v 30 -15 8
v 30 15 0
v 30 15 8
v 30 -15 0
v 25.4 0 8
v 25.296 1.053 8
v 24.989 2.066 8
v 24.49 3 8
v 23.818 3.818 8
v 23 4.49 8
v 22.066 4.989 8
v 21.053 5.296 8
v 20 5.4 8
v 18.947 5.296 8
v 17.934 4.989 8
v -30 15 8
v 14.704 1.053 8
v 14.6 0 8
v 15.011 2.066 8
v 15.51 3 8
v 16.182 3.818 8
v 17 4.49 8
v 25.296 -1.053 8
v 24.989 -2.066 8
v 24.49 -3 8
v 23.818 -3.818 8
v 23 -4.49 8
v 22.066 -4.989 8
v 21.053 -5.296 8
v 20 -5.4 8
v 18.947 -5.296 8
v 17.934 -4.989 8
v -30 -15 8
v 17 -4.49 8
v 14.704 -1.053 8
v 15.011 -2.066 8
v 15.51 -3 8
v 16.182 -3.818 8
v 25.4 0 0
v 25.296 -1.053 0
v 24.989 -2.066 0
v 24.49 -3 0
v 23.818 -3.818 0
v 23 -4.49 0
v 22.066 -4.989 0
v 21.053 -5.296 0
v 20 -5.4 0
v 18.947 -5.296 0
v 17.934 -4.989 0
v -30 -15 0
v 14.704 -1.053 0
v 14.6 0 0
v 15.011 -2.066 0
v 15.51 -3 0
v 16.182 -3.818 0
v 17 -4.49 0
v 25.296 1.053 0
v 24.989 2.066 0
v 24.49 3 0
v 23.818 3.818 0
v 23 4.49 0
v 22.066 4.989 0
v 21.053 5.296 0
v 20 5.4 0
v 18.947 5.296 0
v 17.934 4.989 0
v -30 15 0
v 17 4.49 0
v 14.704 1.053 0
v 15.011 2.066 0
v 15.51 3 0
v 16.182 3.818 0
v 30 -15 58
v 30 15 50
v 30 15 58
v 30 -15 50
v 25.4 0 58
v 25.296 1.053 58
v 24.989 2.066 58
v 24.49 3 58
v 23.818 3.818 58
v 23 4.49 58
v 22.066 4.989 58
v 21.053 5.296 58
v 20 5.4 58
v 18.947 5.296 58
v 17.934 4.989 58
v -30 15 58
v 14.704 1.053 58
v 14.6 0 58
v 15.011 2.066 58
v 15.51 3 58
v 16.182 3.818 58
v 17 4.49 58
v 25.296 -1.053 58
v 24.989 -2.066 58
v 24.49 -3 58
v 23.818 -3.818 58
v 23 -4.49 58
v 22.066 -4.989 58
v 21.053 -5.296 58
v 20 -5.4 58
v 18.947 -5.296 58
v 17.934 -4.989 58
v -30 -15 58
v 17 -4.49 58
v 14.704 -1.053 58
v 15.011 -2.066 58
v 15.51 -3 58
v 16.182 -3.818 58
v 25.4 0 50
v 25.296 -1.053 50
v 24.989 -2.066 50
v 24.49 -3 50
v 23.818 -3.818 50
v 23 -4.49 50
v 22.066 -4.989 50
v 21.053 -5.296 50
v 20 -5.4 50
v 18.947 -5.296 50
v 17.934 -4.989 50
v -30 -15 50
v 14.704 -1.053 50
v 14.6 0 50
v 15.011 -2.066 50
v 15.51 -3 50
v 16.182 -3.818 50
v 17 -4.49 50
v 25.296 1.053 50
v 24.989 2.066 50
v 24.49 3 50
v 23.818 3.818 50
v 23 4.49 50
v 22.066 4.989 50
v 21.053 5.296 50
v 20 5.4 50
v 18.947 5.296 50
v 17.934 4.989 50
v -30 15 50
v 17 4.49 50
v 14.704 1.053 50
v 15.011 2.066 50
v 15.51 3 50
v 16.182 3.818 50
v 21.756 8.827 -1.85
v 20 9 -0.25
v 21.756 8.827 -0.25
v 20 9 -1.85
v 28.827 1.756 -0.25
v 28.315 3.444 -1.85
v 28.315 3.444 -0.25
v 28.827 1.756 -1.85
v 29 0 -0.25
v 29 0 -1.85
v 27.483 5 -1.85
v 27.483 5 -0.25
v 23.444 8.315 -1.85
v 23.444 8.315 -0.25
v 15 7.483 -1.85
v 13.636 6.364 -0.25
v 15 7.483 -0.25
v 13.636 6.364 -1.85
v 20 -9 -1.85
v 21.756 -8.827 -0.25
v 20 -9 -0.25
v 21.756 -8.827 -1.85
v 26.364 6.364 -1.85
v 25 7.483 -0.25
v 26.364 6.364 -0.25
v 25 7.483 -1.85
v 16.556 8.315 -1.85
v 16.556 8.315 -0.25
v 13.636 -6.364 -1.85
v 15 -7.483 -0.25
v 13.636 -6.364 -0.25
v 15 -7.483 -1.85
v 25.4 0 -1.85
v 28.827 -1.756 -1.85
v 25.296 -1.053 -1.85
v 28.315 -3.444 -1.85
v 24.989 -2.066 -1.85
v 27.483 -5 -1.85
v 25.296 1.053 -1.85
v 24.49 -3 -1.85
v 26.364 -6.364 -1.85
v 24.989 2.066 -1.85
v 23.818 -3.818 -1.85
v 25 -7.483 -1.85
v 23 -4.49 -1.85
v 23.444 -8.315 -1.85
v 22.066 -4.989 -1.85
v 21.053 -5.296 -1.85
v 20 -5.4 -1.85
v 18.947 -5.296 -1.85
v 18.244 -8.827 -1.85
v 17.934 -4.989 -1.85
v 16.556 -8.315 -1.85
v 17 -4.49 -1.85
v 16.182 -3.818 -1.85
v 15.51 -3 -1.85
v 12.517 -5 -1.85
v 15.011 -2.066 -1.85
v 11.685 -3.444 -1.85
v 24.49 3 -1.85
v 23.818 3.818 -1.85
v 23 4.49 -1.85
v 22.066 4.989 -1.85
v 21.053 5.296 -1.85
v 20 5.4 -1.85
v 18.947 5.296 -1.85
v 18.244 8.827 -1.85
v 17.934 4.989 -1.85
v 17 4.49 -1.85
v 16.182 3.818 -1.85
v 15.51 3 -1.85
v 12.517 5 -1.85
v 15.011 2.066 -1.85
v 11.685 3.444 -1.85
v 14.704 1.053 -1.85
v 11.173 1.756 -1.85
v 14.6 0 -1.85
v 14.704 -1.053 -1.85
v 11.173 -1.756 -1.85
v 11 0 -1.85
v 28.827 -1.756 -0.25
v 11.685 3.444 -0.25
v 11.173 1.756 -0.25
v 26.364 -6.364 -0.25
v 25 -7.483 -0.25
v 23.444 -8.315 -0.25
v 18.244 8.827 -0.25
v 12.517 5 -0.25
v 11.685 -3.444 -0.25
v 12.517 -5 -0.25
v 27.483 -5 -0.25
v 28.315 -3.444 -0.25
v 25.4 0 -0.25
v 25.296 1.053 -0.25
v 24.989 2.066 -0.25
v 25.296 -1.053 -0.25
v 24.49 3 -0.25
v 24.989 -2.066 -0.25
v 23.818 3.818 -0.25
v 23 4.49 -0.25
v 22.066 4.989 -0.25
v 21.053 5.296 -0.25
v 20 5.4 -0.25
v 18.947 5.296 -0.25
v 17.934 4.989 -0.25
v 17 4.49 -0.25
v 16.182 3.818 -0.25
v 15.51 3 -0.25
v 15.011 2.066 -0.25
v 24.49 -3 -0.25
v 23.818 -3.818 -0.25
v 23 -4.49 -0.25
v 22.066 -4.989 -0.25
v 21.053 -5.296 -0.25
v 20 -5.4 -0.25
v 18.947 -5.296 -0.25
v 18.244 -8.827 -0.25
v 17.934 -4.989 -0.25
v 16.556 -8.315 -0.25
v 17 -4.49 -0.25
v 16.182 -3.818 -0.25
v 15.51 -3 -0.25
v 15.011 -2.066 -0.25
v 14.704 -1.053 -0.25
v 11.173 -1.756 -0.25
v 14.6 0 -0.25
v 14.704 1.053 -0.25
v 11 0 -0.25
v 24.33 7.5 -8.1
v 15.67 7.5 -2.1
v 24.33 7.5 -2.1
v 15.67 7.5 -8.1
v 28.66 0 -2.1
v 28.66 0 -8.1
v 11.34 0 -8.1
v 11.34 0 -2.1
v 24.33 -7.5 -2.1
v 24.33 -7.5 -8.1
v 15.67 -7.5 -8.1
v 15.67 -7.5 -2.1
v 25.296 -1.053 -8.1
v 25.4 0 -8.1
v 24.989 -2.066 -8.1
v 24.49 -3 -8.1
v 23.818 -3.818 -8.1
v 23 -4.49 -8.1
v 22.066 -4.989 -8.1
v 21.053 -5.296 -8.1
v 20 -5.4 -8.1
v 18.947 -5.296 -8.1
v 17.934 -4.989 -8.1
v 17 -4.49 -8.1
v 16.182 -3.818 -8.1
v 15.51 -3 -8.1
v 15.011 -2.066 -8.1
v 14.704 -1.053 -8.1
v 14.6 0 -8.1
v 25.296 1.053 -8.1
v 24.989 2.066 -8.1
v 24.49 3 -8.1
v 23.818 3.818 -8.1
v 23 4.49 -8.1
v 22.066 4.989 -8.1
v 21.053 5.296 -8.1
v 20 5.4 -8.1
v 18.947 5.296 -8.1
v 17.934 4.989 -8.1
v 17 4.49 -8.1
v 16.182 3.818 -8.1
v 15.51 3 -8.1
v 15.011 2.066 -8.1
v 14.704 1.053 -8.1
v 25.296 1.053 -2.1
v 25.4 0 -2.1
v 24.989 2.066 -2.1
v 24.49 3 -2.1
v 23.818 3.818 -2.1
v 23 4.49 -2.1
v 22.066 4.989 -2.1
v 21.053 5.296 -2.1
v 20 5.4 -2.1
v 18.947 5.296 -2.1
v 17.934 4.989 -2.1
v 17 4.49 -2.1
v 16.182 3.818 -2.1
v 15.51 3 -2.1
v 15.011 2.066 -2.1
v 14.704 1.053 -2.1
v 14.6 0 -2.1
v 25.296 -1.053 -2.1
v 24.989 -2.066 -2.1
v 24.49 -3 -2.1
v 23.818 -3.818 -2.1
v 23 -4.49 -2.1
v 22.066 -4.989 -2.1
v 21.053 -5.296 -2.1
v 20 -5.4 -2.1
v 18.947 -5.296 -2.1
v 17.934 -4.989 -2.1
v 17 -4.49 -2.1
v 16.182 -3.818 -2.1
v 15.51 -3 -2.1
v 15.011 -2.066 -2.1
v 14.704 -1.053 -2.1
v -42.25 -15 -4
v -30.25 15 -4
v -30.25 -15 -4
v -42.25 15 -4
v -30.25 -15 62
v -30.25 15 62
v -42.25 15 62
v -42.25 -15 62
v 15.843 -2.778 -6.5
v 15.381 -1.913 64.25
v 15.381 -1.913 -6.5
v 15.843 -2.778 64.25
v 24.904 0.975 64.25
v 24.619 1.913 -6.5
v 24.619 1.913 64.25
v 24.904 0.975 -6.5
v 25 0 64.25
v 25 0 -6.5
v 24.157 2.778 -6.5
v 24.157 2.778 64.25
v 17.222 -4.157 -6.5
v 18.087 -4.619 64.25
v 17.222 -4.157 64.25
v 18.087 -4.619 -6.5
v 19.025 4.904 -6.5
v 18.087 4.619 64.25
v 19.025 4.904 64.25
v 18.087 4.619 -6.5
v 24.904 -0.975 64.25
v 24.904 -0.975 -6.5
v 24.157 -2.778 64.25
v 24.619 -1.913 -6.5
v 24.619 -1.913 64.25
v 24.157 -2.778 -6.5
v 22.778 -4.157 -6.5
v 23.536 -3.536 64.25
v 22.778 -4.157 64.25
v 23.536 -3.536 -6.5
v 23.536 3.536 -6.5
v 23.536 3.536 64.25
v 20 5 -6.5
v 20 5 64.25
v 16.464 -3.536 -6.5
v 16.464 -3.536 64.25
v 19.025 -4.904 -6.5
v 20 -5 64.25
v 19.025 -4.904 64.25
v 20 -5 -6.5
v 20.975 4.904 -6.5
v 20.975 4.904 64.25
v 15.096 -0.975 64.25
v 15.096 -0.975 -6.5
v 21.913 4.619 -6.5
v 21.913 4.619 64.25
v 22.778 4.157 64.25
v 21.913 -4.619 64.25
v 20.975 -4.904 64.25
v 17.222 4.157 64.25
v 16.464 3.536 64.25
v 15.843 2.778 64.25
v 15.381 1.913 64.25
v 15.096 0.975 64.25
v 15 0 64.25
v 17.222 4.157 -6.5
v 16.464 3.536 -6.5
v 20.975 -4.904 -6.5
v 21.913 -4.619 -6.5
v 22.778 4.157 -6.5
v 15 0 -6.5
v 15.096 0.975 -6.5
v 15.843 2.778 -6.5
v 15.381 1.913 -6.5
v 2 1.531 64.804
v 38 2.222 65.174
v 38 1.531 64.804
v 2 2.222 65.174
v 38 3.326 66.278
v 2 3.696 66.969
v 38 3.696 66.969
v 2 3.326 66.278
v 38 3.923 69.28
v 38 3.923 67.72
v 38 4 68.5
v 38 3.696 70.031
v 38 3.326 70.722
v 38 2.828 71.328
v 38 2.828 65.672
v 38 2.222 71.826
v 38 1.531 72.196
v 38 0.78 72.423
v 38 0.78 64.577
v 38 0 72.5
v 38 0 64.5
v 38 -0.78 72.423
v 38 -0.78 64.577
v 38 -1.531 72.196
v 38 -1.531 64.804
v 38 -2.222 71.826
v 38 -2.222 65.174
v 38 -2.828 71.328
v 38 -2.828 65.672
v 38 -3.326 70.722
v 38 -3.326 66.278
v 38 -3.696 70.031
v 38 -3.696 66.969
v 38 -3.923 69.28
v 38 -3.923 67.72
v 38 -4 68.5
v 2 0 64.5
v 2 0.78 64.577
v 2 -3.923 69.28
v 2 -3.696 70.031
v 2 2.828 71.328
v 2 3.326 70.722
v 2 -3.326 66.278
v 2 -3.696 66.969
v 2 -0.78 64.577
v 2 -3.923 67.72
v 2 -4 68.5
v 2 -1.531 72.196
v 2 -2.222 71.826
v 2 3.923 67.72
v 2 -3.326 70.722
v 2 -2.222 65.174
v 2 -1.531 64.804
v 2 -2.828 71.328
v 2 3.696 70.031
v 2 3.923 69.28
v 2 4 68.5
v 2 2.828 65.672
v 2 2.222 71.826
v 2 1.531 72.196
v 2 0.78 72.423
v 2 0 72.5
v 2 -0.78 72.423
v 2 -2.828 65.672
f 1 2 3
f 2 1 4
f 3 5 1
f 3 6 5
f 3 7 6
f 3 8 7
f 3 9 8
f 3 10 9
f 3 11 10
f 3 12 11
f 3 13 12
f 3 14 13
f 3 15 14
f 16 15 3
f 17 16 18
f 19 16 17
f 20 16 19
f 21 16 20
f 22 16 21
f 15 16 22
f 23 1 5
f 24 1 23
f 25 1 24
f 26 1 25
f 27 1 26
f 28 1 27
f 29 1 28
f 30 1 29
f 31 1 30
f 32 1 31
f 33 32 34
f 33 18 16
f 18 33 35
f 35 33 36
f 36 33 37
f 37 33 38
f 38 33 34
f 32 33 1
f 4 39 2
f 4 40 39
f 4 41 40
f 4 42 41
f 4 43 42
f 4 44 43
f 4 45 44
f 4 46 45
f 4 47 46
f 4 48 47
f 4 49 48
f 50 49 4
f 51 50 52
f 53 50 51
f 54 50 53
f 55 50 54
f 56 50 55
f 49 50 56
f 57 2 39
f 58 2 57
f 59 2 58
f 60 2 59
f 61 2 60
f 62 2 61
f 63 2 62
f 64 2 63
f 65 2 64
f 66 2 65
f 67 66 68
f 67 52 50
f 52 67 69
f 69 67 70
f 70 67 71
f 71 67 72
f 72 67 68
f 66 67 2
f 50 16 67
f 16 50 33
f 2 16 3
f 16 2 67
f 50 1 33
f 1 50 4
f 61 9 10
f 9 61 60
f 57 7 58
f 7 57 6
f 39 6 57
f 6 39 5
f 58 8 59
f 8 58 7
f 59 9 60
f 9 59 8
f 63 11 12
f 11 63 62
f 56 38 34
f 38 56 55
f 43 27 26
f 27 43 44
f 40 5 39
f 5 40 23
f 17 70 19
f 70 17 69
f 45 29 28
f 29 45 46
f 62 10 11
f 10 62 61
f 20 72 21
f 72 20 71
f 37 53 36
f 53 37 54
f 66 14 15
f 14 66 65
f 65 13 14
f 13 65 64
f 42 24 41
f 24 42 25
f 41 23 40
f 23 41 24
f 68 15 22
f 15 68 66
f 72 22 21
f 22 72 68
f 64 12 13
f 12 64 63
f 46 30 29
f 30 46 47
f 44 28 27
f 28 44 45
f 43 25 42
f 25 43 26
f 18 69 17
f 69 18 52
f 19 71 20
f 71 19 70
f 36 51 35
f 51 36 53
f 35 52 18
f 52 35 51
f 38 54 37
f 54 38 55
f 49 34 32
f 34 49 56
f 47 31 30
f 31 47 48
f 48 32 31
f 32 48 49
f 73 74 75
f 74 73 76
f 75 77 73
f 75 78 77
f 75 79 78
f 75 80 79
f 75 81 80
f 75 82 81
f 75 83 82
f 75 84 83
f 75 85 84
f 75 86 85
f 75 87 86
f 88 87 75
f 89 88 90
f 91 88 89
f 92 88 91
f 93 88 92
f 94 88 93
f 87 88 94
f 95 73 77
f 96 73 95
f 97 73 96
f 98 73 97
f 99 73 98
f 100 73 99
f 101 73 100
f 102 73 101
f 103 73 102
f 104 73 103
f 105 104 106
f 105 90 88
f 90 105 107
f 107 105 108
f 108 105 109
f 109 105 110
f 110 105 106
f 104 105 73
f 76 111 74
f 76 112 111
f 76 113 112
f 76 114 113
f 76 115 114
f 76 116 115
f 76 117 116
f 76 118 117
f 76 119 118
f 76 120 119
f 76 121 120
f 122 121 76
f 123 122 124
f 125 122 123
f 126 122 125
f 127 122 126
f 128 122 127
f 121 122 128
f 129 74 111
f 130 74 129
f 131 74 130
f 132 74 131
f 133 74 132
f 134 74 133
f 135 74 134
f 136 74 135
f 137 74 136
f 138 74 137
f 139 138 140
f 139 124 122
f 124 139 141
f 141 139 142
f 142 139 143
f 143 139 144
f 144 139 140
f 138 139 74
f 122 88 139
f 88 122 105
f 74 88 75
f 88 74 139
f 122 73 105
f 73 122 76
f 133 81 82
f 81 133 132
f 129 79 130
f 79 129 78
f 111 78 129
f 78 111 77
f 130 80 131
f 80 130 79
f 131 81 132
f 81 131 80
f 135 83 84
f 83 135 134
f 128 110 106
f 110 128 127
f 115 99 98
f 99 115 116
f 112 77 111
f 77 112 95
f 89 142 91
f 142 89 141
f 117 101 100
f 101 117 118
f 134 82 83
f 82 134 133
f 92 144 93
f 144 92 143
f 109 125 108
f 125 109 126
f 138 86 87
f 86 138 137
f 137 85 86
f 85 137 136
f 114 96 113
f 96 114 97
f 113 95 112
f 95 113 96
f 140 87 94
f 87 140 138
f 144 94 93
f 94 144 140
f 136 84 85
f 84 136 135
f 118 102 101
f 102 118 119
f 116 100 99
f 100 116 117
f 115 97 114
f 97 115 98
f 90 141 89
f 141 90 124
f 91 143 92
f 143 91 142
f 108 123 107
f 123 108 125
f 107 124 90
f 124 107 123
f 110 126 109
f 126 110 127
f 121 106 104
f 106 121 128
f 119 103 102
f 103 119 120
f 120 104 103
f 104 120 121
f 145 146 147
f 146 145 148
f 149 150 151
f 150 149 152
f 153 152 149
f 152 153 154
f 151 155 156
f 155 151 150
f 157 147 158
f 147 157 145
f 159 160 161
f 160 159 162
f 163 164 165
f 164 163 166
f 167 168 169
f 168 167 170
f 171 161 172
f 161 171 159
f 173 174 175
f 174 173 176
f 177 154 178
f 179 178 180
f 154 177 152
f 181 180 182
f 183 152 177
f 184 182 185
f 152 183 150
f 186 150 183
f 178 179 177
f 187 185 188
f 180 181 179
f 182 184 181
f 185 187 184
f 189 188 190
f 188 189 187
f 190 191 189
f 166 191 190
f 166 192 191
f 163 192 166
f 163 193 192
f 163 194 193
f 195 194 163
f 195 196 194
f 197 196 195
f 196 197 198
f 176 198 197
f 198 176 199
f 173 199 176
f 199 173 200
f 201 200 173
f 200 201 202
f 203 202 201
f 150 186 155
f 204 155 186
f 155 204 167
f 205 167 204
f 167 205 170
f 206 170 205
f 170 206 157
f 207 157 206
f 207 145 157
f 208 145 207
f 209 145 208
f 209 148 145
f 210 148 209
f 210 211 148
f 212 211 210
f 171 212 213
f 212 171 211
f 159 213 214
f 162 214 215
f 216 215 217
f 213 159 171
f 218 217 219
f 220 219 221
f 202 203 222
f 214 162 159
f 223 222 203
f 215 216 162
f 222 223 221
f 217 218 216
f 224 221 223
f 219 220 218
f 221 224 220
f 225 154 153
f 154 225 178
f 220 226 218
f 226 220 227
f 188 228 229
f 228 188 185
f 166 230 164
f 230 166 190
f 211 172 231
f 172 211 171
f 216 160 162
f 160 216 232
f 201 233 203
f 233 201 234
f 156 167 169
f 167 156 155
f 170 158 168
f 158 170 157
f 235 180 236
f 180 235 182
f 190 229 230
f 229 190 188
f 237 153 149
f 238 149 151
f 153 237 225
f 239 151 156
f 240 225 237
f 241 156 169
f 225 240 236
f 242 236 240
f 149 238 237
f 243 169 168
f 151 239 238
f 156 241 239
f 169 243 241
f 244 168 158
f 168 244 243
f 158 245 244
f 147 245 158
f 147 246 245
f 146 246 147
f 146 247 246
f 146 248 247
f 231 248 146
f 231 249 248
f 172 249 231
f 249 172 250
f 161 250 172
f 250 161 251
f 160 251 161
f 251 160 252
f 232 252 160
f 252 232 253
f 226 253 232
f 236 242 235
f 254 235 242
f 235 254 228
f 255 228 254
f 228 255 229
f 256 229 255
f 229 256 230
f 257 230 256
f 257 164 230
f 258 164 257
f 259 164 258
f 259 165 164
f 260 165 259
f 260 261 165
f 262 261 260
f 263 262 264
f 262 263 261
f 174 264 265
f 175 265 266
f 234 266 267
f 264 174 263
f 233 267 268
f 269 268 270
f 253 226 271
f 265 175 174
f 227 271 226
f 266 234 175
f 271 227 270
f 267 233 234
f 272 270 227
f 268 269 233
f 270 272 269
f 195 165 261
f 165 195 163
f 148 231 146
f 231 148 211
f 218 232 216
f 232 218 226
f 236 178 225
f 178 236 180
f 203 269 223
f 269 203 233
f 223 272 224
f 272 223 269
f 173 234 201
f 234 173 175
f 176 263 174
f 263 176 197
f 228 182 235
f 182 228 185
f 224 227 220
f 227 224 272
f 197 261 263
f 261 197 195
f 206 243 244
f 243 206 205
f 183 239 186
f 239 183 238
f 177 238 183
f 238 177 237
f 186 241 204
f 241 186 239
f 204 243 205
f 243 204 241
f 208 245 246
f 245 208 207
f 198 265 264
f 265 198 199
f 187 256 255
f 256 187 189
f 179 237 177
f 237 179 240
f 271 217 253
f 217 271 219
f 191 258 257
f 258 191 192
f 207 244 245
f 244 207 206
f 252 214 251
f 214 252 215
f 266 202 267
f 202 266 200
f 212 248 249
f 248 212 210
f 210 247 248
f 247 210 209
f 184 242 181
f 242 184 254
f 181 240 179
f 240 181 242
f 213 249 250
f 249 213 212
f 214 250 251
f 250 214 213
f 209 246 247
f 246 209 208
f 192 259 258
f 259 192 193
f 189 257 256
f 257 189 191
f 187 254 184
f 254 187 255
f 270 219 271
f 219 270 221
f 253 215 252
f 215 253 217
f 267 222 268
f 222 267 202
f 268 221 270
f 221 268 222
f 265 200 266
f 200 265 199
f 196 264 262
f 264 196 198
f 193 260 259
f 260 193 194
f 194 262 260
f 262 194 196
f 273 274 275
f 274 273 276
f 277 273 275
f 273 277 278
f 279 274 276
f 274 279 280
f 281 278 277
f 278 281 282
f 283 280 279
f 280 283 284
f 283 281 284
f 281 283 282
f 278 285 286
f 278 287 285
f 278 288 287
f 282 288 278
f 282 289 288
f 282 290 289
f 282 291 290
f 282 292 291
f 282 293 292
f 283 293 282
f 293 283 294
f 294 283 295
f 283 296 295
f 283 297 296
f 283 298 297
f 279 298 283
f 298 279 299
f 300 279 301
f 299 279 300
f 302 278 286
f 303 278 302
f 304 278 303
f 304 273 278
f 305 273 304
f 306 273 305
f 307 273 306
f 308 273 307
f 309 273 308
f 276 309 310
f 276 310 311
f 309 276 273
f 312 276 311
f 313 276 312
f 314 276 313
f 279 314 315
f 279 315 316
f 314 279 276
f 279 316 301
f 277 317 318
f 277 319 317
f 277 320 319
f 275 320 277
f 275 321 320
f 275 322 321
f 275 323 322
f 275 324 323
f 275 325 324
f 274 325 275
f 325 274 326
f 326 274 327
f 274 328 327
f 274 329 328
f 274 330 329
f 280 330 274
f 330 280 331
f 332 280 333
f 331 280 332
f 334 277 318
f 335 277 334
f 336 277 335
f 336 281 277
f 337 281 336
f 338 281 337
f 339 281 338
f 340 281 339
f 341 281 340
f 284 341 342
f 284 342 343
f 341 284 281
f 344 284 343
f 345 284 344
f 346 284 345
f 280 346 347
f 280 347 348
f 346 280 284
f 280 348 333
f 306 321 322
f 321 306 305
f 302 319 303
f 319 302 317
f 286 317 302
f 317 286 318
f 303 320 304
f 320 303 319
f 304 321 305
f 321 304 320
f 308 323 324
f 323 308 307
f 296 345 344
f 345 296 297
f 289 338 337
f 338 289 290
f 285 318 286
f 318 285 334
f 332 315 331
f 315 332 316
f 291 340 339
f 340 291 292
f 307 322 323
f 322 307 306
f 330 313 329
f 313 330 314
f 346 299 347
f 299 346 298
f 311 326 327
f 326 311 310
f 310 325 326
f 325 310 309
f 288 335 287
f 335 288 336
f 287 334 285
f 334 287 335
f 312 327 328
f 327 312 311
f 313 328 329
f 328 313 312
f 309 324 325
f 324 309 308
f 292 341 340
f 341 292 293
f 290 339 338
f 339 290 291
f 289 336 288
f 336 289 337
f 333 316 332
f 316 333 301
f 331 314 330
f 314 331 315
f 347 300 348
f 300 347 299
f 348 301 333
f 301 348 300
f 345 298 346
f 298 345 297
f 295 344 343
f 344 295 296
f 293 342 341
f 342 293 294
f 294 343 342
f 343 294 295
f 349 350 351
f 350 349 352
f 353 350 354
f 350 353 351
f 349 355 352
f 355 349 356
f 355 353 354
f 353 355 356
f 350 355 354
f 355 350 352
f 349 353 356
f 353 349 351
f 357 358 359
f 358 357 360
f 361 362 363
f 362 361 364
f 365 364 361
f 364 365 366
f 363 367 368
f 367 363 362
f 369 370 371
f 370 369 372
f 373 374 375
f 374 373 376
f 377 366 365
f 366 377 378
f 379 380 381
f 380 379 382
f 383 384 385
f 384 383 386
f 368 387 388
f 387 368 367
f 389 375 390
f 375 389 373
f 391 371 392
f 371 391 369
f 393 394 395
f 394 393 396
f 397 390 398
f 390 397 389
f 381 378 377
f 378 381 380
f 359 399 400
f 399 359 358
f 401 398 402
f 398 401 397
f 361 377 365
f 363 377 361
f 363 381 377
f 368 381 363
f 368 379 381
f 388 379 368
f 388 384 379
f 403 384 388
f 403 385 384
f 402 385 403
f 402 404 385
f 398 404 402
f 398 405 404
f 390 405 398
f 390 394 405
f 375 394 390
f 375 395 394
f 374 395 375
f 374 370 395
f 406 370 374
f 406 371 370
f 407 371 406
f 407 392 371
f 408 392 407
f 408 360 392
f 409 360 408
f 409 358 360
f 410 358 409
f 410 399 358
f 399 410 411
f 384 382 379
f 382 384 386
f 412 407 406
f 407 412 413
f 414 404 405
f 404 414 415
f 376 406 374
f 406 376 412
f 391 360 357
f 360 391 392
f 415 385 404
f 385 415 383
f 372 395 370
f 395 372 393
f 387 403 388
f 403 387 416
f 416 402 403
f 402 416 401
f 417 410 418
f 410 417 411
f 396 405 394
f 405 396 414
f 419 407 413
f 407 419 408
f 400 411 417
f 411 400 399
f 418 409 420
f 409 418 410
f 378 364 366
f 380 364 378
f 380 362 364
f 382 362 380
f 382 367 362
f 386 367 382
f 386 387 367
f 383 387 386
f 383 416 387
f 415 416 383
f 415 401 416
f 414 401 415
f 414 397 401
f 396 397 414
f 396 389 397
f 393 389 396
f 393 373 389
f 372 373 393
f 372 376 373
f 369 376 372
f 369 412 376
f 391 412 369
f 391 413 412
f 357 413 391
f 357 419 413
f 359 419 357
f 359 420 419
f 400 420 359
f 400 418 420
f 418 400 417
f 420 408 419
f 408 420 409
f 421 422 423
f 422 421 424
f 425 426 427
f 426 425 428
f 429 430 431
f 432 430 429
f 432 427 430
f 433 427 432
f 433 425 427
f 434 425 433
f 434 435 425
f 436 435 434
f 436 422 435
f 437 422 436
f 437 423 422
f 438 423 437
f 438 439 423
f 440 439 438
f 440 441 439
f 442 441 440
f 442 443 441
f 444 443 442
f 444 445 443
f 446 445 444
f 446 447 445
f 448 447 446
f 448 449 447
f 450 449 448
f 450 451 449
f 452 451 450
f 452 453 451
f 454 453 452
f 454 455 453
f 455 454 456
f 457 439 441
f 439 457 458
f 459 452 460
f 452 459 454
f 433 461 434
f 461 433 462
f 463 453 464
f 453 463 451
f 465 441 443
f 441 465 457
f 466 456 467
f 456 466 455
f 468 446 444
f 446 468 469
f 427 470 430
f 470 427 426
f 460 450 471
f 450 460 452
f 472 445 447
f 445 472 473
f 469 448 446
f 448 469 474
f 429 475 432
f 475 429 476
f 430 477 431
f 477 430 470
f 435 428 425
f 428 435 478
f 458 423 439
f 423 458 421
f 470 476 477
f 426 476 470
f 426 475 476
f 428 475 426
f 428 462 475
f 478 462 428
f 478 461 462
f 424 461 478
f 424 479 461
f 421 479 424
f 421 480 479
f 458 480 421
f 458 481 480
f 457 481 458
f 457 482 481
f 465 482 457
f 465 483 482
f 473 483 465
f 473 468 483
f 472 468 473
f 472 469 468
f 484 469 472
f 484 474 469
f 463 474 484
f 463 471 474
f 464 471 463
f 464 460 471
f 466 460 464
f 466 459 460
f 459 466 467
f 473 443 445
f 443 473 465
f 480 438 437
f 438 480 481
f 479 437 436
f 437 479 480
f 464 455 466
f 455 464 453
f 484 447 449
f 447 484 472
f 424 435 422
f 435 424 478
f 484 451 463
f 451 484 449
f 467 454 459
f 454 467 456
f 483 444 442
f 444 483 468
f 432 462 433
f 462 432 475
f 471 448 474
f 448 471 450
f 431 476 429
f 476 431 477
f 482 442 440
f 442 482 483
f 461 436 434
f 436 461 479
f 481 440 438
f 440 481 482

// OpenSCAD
$fn = 32;

// ------------------------------------------------------------------------
// C clamp: throat 50 mm, screw d10
// Every part is its own module, assembly() places every instance.
// ------------------------------------------------------------------------

// --- part 1 ---
module clamp_arm() {
  difference() {
    translate([-30, -15, 0]) cube([60, 30, 8]);
    translate([20, 0, -1]) cylinder(h = 10, d = 10.8);
  }
}

// --- part 2 ---
module clamp_spine() {
  difference() {
    translate([-33, -15, 0]) cube([66, 30, 12]);
  }
}

// --- part 3 ---
module clamp_screw() {
  translate([0, 0, -35.375]) cylinder(h = 70.75, d = 10);
}

// --- part 4 ---
module clamp_washer() {
  difference() {
      translate([0, 0, 0]) cylinder(h = 1.6, d = 18);
      translate([0, 0, -1]) cylinder(h = 3.6, d = 10.8);
    }
}

// --- part 5 ---
module clamp_nut() {
  difference() {
    linear_extrude(height = 6) polygon(points = [[8.66, 0], [4.33, 7.5], [-4.33, 7.5], [-8.66, 0], [-4.33, -7.5], [4.33, -7.5]]);
    translate([0, 0, -1]) cylinder(h = 8, d = 10.8);
  }
}

// --- part 6 ---
module tommy_bar() {
  translate([0, 0, -18]) cylinder(h = 36, d = 8);
}

// --- assembly ---
module assembly() {
  color([0.80, 0.24, 0.20]) translate([0, 0, 0]) rotate([0, 0, 0]) clamp_arm();
  color([0.20, 0.45, 0.75]) translate([0, 0, 50]) rotate([0, 0, 0]) clamp_arm();
  color([0.25, 0.62, 0.32]) translate([-42.25, 0, 29]) rotate([0, 90, 0]) clamp_spine();
  color([0.92, 0.70, 0.18]) translate([20, 0, 28.875]) rotate([0, 0, 0]) clamp_screw();
  color([0.58, 0.35, 0.70]) translate([20, 0, -1.85]) rotate([0, 0, 0]) clamp_washer();
  color([0.16, 0.66, 0.66]) translate([20, 0, -8.1]) rotate([0, 0, 0]) clamp_nut();
  color([0.85, 0.48, 0.18]) translate([20, 0, 68.5]) rotate([0, 90, 0]) tommy_bar();
}

assembly();
